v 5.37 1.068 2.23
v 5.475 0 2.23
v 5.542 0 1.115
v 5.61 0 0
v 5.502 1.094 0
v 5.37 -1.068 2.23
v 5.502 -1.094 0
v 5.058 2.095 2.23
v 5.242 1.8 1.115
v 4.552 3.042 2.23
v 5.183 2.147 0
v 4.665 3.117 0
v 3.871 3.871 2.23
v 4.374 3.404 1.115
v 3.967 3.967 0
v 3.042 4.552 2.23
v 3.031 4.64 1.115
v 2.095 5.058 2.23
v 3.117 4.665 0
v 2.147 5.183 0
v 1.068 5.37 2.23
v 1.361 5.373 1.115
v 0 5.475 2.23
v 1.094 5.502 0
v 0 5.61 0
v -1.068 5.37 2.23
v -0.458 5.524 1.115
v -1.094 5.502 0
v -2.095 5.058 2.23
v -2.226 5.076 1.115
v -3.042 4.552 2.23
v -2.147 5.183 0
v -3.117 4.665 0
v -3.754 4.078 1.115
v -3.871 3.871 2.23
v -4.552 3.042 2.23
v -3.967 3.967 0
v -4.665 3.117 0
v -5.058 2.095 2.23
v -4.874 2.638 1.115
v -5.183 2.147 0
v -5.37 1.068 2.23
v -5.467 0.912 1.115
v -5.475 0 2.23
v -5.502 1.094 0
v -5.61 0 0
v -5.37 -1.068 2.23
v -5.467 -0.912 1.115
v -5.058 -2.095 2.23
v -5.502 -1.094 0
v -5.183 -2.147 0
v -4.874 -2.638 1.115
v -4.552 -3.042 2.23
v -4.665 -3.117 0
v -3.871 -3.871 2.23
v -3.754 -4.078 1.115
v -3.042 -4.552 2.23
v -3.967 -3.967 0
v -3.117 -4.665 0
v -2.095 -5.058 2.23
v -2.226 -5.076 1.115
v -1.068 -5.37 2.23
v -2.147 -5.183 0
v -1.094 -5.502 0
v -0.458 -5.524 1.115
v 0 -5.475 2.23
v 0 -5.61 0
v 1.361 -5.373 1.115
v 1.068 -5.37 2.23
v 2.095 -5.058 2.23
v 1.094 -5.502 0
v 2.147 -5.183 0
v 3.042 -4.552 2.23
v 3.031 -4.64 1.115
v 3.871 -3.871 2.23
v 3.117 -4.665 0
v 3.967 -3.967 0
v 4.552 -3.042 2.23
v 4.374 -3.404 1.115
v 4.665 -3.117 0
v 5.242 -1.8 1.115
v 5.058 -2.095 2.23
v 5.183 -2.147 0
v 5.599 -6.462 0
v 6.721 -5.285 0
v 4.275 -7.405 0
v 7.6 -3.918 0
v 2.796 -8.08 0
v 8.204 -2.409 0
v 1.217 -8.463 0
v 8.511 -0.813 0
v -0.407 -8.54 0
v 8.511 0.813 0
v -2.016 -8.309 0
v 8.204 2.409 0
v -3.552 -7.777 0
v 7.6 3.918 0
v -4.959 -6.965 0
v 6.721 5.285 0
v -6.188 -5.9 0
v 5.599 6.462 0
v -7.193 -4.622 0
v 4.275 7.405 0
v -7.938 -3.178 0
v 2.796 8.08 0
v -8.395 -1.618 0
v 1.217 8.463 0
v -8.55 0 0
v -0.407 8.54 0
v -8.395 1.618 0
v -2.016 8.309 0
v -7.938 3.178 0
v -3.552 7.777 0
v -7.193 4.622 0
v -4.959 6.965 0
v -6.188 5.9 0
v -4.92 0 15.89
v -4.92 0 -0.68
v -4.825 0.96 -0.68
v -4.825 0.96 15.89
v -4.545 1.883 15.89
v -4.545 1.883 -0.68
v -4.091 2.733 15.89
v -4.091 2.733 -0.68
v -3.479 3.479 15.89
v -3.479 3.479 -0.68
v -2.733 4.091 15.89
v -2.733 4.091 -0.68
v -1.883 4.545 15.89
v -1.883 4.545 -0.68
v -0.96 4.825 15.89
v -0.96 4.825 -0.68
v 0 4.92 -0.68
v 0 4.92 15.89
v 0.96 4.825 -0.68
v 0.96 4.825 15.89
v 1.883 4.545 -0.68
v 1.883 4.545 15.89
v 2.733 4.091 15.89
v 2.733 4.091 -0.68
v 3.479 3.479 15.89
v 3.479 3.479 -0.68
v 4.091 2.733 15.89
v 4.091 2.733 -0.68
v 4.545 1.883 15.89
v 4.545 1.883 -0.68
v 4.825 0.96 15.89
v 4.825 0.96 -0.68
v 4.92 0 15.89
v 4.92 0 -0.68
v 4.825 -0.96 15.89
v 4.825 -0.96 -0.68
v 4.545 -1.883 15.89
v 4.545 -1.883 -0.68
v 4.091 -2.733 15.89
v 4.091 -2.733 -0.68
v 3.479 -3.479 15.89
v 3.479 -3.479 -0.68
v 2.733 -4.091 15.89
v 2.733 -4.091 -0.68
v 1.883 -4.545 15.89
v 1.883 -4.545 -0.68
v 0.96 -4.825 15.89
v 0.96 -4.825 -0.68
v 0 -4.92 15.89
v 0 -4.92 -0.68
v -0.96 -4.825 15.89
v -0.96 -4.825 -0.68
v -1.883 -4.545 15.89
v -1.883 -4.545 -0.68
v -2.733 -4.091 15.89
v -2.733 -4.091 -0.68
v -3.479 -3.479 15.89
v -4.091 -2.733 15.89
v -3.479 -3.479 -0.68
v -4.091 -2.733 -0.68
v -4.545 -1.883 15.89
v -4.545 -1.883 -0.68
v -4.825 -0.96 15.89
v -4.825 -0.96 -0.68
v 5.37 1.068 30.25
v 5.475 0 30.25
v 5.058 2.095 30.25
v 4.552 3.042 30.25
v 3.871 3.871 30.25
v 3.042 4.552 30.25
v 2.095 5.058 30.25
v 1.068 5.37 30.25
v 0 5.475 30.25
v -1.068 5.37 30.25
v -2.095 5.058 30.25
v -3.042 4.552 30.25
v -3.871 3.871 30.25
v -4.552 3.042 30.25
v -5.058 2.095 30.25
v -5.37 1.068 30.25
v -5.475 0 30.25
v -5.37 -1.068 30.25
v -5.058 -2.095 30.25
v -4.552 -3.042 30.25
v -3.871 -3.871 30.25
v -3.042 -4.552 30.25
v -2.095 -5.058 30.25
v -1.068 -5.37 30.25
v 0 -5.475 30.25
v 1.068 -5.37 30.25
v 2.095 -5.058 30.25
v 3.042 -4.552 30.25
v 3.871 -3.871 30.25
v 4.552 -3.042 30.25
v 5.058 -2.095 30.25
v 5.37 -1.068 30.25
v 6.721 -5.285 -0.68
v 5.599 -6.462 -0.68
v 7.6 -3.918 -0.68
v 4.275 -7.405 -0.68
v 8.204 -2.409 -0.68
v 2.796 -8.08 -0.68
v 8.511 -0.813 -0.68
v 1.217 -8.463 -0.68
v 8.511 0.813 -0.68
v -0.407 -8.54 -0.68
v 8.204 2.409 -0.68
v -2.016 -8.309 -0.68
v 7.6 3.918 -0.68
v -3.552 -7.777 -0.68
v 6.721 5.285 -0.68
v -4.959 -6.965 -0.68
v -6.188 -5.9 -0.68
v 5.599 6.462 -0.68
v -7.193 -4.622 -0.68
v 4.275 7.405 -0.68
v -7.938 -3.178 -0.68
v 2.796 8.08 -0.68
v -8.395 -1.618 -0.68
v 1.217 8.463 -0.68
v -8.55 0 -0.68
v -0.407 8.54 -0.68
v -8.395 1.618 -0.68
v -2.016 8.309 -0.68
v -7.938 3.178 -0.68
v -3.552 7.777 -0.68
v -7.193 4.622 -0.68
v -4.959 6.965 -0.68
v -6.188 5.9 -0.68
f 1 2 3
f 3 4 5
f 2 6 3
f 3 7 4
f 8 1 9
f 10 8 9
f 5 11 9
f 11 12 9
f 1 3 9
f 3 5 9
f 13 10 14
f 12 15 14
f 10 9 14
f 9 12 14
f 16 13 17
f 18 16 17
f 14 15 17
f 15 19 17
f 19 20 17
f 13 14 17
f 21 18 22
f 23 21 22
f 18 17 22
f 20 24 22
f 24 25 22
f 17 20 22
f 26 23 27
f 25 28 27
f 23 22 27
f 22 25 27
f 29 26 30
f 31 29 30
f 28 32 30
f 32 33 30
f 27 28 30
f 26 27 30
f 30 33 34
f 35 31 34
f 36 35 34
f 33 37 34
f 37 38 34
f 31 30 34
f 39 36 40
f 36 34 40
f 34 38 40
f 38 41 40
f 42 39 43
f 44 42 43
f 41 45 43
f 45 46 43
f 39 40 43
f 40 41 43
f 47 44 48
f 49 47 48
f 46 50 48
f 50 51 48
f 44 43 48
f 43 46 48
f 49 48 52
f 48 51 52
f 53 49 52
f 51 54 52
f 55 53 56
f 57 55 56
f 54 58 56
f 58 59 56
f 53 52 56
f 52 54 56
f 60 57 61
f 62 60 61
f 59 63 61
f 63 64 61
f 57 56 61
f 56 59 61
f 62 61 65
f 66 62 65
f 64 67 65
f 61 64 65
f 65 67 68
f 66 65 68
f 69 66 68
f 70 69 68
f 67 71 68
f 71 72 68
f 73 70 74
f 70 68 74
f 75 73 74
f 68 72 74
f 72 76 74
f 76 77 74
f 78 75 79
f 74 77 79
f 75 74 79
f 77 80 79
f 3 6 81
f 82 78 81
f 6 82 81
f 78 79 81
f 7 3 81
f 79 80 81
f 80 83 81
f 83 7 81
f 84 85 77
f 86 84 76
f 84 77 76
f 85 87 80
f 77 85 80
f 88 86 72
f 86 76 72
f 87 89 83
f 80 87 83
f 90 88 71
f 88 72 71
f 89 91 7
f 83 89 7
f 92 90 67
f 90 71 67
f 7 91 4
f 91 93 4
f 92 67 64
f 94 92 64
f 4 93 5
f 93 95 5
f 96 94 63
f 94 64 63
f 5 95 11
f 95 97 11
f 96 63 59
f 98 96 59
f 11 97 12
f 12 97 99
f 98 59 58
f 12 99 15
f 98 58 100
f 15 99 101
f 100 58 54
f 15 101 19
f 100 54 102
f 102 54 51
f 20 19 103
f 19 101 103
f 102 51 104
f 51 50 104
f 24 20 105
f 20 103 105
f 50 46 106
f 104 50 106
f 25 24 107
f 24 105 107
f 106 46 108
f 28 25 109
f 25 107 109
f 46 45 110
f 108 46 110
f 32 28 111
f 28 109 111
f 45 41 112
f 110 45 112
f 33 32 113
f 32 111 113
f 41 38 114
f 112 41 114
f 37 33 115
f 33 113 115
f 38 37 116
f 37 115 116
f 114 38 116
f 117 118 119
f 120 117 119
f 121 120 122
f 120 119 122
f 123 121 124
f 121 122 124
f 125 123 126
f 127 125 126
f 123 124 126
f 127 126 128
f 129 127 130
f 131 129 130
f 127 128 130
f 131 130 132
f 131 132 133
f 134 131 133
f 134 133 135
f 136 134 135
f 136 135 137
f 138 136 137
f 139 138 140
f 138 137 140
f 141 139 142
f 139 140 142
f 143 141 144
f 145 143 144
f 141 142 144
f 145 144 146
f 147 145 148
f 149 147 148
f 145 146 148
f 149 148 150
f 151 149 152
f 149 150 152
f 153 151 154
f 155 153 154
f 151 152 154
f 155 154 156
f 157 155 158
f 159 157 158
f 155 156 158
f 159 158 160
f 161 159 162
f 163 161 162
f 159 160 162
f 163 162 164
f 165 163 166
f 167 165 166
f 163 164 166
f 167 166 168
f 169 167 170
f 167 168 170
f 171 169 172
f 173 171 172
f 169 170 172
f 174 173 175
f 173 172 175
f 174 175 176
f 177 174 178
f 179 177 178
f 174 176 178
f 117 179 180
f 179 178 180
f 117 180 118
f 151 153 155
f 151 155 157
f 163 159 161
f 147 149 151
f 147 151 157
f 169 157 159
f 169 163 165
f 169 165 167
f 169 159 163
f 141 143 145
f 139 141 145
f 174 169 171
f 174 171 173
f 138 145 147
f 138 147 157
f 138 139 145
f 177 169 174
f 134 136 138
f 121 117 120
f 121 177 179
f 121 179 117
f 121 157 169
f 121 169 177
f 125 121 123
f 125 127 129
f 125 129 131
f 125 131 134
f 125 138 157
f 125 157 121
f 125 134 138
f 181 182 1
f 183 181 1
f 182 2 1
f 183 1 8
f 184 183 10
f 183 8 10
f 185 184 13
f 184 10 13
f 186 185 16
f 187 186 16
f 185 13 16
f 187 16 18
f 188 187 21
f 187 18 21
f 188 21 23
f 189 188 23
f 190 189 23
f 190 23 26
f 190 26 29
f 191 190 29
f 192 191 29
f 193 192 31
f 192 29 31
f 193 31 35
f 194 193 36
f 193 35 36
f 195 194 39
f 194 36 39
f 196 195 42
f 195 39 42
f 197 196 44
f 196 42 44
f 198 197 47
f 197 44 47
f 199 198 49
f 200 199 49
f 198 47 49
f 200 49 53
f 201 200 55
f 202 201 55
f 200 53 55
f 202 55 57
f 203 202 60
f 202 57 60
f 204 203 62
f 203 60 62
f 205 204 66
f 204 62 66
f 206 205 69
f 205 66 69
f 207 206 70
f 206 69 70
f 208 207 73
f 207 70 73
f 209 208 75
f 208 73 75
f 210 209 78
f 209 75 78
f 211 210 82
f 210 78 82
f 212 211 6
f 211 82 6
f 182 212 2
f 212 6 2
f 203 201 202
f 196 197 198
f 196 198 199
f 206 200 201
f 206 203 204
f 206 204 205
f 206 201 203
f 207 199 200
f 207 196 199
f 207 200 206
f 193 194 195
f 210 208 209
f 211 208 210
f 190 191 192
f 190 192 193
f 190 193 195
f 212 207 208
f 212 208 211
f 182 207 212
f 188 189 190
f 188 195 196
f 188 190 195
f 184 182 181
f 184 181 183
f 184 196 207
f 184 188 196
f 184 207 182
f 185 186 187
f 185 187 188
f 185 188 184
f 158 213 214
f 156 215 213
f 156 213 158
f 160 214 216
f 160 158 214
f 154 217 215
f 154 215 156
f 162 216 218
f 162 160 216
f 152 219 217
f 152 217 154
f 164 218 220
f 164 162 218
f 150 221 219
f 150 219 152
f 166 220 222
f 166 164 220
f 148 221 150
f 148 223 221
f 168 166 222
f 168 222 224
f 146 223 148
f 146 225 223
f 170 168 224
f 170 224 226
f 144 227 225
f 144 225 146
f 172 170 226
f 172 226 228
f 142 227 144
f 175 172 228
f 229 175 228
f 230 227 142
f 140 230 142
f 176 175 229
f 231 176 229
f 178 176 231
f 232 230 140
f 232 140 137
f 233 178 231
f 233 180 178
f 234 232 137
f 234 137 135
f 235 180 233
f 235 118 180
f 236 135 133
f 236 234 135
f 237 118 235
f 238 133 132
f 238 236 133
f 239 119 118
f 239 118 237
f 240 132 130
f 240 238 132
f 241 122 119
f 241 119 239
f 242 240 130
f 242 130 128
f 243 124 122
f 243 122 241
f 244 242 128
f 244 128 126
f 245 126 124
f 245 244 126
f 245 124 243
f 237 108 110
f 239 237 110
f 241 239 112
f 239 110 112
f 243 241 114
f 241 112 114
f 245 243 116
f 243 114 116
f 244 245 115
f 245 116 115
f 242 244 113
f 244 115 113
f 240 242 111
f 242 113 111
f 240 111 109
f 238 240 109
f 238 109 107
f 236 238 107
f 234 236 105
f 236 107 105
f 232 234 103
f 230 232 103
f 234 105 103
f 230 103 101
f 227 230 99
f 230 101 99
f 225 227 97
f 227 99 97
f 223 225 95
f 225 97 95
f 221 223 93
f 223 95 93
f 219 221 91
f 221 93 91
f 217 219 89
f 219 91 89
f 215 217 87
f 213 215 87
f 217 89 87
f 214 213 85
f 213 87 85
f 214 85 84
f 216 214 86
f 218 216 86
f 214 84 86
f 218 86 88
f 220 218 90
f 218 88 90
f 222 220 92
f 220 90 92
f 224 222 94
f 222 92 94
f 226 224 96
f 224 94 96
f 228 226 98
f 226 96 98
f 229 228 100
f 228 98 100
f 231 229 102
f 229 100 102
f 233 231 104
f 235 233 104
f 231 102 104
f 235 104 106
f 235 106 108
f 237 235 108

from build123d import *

# Parameters (mm, degrees)
SKETCH2_R           = 5.475
SKETCH1_R           = 5.61
SKETCH3_R           = 5.475
SKETCH2_2_R         = 5.475
SKETCH4_R           = 8.55
BOSS_EXTRUDE1_DEPTH = 0.68
SKETCH5_R           = 4.92
CUT_EXTRUDE1_DEPTH  = 16.57


with BuildPart() as part:
    # Sketch2 → Loft1 section 0
    with BuildSketch(Plane.XY.offset(2.23)):
        Circle(SKETCH2_R)
    # Sketch1 → Loft1 section 1
    with BuildSketch(Plane.XY):
        Circle(SKETCH1_R)
    loft()

    # Sketch3 → Loft2 section 0
    with BuildSketch(Plane.XY.offset(30.25)):
        Circle(SKETCH3_R)
    # Sketch2<2> → Loft2 section 1
    with BuildSketch(Plane.XY.offset(2.23)):
        Circle(SKETCH2_2_R)
    loft()

    # Sketch4 → Boss-Extrude1 (add)
    with BuildSketch(Plane(origin=(0, 0, 0), x_dir=(-1, 0, 0), z_dir=(0, 0, -1))):
        Circle(SKETCH4_R)
    extrude(amount=BOSS_EXTRUDE1_DEPTH)

    # Sketch5 → Cut-Extrude1 (cut)
    with BuildSketch(Plane(origin=(0, 0, -0.68), x_dir=(-1, 0, 0), z_dir=(0, 0, -1))):
        Circle(SKETCH5_R)
    extrude(amount=-CUT_EXTRUDE1_DEPTH, mode=Mode.SUBTRACT)


solid = part.part
